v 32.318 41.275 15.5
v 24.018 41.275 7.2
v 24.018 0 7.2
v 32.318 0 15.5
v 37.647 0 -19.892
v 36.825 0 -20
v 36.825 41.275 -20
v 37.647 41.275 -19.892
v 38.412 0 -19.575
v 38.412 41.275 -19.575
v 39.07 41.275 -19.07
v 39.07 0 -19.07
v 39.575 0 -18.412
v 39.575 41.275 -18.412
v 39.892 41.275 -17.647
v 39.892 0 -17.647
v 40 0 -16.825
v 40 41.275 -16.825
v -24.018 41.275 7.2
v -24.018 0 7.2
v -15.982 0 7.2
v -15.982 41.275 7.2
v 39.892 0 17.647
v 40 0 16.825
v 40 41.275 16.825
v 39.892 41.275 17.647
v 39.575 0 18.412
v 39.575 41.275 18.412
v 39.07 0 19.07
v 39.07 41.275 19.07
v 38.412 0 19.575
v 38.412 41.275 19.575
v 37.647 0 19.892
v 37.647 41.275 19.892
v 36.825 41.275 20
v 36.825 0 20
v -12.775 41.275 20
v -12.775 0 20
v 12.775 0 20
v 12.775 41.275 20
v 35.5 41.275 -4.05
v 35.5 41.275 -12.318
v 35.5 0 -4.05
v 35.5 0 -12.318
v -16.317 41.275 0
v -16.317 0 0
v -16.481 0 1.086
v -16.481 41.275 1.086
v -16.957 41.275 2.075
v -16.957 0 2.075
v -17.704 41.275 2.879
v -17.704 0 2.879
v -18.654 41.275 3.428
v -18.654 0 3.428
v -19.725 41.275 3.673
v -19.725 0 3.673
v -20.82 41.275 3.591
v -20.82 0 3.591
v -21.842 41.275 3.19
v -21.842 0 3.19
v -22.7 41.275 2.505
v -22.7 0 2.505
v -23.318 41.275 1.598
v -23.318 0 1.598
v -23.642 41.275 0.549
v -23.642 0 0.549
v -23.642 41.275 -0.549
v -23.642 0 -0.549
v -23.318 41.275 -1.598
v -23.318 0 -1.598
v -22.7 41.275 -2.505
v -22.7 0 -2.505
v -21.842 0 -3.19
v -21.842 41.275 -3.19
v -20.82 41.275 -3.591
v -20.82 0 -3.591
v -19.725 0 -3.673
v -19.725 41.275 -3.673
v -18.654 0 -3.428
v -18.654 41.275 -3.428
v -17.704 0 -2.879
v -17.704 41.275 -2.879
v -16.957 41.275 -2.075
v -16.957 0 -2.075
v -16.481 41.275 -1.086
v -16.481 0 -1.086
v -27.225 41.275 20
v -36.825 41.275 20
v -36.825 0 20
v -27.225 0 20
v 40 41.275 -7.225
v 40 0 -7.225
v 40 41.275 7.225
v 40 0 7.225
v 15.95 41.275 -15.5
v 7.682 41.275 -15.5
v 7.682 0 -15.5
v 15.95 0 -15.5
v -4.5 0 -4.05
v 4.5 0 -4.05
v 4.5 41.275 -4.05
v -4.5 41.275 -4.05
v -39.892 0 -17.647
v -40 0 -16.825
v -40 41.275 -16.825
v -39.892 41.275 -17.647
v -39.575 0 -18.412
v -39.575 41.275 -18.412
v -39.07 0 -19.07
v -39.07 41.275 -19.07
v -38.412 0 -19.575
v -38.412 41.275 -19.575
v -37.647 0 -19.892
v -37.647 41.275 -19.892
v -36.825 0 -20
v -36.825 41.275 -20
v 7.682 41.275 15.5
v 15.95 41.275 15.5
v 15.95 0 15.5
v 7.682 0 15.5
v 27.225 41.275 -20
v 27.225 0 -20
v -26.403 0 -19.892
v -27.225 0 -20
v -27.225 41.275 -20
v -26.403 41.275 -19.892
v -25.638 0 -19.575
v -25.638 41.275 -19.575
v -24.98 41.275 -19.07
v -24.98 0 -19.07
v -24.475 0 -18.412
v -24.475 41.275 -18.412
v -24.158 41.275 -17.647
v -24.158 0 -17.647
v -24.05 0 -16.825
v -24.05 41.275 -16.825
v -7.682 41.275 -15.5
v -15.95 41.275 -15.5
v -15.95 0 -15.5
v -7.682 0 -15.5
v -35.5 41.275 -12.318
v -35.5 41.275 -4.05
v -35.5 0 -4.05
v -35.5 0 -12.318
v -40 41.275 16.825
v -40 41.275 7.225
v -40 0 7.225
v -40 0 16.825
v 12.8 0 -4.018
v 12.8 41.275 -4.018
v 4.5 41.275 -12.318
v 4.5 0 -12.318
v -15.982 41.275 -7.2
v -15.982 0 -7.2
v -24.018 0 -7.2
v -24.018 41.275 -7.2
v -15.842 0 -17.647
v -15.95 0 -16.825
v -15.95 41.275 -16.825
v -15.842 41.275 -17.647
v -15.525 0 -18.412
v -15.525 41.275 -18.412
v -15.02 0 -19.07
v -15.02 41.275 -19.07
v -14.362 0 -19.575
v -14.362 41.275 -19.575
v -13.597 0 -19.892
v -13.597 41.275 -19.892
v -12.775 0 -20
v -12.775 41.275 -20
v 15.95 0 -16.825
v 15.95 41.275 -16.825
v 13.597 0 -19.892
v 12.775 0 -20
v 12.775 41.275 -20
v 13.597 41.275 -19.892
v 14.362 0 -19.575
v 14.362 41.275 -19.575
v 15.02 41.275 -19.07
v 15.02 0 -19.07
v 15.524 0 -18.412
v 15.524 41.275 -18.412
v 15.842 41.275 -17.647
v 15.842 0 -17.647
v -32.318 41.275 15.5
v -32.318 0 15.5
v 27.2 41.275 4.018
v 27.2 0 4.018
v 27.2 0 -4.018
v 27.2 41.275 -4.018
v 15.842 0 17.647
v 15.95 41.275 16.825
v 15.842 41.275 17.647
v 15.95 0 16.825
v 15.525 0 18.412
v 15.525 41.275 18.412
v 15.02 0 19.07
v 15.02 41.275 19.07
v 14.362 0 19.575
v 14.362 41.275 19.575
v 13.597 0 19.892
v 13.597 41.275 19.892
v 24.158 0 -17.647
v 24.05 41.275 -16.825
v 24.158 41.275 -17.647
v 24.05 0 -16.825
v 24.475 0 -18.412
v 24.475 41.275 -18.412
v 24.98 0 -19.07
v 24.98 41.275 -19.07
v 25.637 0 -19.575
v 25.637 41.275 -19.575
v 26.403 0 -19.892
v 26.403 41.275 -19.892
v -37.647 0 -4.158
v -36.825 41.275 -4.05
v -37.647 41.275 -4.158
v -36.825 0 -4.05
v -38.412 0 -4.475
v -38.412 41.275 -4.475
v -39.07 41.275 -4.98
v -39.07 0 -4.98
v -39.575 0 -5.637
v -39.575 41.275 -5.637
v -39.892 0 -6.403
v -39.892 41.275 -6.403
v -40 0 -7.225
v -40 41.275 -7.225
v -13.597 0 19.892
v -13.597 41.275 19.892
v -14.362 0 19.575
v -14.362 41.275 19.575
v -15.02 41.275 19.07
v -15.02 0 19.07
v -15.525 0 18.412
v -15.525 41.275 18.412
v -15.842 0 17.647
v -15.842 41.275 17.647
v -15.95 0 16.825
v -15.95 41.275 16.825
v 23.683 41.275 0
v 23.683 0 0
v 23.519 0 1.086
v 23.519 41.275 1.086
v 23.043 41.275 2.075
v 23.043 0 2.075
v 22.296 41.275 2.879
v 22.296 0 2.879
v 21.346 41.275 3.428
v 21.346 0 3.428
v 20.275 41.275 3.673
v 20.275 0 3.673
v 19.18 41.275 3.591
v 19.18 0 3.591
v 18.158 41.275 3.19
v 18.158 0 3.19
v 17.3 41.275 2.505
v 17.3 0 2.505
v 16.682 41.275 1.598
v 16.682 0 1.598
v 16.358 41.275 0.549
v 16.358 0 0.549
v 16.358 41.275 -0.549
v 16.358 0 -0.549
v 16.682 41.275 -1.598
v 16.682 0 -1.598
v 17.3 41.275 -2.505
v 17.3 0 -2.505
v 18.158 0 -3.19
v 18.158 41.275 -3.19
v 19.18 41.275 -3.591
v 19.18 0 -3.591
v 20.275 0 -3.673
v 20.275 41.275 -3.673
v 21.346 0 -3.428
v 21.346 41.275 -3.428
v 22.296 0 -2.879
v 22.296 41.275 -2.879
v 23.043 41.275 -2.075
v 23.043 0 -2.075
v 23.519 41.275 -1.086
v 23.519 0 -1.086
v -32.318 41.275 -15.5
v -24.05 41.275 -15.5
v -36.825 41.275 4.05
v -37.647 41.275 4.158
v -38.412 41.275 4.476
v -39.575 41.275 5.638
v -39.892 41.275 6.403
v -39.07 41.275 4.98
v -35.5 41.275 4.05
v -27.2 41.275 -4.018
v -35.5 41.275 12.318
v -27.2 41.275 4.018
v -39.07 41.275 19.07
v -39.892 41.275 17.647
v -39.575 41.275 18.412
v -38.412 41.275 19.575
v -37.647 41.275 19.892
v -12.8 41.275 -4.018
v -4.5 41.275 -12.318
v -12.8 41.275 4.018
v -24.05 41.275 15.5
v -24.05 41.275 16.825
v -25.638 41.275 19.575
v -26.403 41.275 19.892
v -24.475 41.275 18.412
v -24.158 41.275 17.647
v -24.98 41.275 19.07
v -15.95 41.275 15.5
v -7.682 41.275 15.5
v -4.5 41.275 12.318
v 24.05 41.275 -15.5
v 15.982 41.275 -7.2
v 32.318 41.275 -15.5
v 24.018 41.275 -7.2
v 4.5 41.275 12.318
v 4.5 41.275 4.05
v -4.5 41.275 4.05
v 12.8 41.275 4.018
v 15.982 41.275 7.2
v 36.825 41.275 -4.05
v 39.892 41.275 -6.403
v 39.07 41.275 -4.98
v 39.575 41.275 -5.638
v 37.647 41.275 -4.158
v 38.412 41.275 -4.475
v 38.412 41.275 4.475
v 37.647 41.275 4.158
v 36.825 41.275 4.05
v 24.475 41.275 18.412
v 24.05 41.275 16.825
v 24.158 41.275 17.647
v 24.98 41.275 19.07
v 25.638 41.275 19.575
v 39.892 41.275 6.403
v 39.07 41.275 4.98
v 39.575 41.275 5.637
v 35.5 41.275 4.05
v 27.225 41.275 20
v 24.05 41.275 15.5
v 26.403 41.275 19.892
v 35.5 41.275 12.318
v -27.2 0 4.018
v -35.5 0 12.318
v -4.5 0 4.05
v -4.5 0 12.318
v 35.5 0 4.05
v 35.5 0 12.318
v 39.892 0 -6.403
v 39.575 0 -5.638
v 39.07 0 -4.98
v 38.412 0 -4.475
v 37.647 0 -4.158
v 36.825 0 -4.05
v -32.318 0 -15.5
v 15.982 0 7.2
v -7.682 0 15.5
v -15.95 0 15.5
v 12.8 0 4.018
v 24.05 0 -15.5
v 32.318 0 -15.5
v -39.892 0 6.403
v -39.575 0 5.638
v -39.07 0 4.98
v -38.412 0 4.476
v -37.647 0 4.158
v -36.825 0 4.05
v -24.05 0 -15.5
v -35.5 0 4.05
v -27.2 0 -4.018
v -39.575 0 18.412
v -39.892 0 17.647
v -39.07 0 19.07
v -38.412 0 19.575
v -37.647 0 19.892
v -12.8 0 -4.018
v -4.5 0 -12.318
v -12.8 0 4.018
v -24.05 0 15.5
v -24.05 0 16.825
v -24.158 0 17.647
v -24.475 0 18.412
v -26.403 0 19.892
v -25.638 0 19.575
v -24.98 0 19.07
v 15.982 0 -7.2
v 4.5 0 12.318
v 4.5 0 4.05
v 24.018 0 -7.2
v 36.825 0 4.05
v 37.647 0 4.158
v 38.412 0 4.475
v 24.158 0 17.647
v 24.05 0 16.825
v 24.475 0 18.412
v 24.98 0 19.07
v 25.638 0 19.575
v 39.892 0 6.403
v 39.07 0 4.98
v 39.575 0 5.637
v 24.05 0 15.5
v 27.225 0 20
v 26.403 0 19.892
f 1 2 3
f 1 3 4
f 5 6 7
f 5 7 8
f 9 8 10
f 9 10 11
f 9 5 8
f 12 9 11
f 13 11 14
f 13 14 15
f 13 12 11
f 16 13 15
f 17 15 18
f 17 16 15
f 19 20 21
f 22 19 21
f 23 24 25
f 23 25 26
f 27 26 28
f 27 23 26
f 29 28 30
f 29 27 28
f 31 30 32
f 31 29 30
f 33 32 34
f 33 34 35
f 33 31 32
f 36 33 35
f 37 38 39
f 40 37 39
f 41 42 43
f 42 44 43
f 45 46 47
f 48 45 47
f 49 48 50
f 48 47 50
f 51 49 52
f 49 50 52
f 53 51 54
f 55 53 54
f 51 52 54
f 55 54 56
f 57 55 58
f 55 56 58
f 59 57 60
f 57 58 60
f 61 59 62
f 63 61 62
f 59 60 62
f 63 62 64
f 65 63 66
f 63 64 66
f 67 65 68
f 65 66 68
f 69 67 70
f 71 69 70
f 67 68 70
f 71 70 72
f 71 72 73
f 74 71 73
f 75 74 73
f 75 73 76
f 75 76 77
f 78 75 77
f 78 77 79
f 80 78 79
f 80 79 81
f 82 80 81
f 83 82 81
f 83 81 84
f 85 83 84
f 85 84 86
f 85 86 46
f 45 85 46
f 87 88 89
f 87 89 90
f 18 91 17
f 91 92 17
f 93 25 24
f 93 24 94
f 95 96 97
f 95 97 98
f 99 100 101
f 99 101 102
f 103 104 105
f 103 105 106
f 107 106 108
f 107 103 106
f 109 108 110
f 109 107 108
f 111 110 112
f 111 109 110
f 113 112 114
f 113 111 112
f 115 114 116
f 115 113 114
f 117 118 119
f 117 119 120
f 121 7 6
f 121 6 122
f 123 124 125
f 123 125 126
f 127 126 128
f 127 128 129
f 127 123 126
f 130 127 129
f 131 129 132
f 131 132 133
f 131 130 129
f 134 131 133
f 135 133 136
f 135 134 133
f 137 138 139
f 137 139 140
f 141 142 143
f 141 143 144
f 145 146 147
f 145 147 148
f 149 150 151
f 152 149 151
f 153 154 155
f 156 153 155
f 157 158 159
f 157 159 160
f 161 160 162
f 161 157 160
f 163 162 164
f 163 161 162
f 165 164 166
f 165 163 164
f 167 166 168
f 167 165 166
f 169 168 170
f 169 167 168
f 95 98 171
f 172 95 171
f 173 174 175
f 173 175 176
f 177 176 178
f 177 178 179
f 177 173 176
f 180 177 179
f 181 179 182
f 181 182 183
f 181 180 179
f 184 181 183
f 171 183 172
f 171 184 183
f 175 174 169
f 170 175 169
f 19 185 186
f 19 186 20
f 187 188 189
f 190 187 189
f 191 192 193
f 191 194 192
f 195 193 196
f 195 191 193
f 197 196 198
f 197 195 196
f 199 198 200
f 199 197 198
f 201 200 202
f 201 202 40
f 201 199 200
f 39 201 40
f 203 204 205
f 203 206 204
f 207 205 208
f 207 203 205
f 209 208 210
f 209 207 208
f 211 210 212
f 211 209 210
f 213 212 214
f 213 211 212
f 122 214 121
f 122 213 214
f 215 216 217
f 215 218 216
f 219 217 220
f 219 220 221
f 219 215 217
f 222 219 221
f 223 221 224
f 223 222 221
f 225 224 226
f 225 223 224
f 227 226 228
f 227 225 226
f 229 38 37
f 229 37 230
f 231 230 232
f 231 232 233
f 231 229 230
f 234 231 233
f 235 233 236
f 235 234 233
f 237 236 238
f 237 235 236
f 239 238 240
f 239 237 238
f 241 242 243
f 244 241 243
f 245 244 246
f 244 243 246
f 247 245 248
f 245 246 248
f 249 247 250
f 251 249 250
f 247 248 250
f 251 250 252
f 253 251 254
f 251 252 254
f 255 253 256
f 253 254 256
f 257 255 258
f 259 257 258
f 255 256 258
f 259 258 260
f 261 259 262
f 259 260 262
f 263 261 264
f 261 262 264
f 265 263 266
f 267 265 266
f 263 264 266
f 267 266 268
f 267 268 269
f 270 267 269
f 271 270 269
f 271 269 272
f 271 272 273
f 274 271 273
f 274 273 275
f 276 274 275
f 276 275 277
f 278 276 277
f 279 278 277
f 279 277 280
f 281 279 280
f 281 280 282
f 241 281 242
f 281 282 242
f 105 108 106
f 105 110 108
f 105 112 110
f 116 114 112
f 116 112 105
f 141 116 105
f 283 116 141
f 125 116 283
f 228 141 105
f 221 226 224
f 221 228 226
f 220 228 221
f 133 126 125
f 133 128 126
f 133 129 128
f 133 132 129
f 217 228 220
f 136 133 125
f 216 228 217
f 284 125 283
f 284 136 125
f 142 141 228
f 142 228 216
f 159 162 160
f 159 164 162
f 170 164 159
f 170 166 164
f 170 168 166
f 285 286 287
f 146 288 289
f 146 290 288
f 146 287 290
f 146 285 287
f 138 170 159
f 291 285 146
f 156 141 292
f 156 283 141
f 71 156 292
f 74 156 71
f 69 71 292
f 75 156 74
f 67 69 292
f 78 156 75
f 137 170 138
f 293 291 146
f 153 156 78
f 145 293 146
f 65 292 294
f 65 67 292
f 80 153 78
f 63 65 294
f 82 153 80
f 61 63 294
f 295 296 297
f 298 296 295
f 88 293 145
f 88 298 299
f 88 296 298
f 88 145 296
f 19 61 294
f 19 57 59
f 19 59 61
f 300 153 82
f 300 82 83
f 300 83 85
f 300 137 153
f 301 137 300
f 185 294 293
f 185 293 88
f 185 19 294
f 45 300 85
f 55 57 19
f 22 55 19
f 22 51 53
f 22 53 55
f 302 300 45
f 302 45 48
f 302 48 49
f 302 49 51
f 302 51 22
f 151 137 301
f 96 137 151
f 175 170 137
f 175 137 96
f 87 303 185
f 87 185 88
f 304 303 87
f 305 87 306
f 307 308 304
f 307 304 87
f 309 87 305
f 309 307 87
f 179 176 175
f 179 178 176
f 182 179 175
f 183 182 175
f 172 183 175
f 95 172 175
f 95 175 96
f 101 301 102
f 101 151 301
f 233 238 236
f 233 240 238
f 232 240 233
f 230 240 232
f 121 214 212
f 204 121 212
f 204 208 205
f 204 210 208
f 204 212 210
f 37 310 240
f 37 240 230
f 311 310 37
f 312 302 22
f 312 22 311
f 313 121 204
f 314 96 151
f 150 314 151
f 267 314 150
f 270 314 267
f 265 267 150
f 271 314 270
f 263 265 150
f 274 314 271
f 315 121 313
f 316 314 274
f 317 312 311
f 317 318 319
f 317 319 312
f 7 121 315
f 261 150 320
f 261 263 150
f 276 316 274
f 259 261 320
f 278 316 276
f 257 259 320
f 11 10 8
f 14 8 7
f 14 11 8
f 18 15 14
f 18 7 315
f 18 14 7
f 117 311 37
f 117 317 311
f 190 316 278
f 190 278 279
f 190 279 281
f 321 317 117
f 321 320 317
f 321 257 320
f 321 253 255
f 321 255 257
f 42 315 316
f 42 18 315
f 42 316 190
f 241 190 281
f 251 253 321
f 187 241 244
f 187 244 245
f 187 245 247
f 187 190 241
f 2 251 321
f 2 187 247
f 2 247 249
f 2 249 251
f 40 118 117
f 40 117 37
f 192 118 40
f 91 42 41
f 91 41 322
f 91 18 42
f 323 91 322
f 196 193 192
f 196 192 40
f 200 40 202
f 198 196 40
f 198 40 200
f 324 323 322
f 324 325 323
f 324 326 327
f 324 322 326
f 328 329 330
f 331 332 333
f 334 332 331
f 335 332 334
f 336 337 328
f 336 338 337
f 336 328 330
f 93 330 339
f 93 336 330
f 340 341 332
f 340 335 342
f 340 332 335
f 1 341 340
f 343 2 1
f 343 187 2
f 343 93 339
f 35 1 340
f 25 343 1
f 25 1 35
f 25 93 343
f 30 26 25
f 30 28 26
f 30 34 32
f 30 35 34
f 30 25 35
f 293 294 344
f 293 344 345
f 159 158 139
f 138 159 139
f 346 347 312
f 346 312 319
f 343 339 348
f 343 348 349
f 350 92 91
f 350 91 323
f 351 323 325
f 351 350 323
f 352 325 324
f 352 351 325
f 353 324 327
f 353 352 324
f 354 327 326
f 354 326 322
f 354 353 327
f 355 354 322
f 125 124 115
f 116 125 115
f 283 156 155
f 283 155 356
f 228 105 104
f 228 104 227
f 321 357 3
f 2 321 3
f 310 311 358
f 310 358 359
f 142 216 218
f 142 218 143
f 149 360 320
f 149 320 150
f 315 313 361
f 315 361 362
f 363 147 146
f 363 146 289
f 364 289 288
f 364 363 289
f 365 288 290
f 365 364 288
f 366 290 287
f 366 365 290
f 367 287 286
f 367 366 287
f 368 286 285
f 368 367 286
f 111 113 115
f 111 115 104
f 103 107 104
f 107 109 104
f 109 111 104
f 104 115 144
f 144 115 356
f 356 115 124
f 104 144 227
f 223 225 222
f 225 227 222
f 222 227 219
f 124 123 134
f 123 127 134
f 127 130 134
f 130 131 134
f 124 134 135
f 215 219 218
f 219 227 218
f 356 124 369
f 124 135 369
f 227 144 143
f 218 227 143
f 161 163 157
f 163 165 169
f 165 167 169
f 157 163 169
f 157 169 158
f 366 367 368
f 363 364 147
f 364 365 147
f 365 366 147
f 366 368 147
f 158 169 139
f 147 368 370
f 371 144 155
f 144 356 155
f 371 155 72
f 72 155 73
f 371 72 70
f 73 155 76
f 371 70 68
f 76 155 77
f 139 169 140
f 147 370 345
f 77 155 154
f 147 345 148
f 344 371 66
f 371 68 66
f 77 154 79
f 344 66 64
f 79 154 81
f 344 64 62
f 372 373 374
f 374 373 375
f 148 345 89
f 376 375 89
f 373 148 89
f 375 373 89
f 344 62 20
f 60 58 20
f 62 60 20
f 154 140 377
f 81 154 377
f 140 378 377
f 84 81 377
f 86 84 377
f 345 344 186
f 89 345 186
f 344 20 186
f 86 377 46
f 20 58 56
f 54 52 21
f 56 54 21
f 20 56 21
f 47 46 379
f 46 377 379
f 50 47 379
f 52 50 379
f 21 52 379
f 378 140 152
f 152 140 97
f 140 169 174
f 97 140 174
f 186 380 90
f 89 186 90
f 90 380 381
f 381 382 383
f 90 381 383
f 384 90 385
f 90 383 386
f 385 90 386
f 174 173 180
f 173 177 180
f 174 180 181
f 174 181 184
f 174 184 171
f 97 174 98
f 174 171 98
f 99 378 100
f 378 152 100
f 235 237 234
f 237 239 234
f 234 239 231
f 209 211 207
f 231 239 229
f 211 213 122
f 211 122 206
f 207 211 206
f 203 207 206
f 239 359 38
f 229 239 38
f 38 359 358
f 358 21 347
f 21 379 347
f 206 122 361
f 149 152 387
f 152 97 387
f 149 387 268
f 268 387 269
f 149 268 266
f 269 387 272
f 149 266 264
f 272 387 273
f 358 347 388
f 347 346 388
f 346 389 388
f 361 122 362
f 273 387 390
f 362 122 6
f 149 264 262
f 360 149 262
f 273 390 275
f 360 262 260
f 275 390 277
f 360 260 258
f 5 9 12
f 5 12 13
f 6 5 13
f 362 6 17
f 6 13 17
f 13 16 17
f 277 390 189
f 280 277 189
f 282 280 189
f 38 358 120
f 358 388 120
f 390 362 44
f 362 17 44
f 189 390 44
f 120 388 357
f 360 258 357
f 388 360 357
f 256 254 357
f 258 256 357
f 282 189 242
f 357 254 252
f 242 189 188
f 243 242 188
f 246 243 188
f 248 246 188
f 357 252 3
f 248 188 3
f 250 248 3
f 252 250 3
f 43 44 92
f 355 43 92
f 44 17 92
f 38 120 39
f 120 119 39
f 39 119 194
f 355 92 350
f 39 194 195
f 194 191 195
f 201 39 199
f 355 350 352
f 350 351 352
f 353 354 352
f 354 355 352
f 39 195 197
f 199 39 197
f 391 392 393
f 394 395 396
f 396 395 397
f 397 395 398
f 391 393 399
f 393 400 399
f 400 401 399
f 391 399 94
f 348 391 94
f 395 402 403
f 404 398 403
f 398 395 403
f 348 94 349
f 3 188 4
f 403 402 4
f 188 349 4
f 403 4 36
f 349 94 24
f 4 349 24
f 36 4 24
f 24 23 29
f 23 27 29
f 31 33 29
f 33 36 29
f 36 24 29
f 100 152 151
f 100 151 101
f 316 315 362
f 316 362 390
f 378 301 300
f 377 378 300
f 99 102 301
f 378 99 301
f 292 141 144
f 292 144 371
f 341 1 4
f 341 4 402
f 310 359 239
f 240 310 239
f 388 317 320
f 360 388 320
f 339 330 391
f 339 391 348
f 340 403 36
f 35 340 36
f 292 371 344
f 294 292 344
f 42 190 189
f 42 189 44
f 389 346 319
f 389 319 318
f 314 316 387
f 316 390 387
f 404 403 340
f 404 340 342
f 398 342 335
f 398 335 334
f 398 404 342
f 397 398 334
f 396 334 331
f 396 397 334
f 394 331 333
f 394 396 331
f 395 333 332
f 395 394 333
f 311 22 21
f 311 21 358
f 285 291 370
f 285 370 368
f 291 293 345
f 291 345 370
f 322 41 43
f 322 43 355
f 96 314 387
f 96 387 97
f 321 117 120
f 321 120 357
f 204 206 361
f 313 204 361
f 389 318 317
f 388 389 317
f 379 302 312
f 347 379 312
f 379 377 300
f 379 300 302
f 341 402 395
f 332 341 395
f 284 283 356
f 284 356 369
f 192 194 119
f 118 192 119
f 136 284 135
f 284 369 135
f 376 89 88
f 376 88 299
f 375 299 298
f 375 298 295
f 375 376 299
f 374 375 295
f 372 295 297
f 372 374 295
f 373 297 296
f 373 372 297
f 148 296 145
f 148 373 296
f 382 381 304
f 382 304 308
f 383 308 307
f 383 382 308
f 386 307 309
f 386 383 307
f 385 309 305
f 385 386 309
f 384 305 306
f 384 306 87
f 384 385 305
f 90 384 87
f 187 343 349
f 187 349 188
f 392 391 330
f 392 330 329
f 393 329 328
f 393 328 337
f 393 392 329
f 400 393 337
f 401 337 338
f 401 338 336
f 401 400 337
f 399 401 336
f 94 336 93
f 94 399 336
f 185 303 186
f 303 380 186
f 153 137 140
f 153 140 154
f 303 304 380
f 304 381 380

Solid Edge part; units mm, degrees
sketch "Sketch1" plane through (0, 0, 0) normal (0, -1, 0) x (1, 0, 0)
  line L0 (-24.05, 16.825) -> (-24.05, 15.5)
  line L1 (-24.05, 15.5) -> (-32.318, 15.5)
  line L2 (-32.318, 15.5) -> (-24.018, 7.2)
  line L3 (-24.018, 7.2) -> (-15.982, 7.2)
  line L4 (-15.982, 7.2) -> (-7.682, 15.5)
  line L5 (-7.682, 15.5) -> (-15.95, 15.5)
  line L6 (-15.95, 15.5) -> (-15.95, 16.825)
  arc A0 (-12.775, 20) -> (-15.95, 16.825) centre (-12.775, 16.825) ccw
  line L7 (-12.775, 20) -> (12.775, 20)
  arc A1 (15.95, 16.825) -> (12.775, 20) centre (12.775, 16.825) ccw
  line L8 (15.95, 16.825) -> (15.95, 15.5)
  line L9 (15.95, 15.5) -> (7.682, 15.5)
  line L10 (7.682, 15.5) -> (15.982, 7.2)
  line L11 (15.982, 7.2) -> (24.018, 7.2)
  line L12 (24.018, 7.2) -> (32.318, 15.5)
  line L13 (32.318, 15.5) -> (24.05, 15.5)
  line L14 (24.05, 15.5) -> (24.05, 16.825)
  arc A2 (27.225, 20) -> (24.05, 16.825) centre (27.225, 16.825) ccw
  line L15 (27.225, 20) -> (36.825, 20)
  arc A3 (40, 16.825) -> (36.825, 20) centre (36.825, 16.825) ccw
  line L16 (40, 16.825) -> (40, 7.225)
  arc A4 (36.825, 4.05) -> (40, 7.225) centre (36.825, 7.225) ccw
  line L17 (36.825, 4.05) -> (35.5, 4.05)
  line L18 (35.5, 4.05) -> (35.5, 12.318)
  line L19 (35.5, 12.318) -> (27.2, 4.018)
  line L20 (27.2, 4.018) -> (27.2, -4.018)
  line L21 (27.2, -4.018) -> (35.5, -12.318)
  line L22 (35.5, -12.318) -> (35.5, -4.05)
  line L23 (35.5, -4.05) -> (36.825, -4.05)
  arc A5 (40, -7.225) -> (36.825, -4.05) centre (36.825, -7.225) ccw
  line L24 (40, -7.225) -> (40, -16.825)
  arc A6 (36.825, -20) -> (40, -16.825) centre (36.825, -16.825) ccw
  line L25 (36.825, -20) -> (27.2248, -20)
  arc A7 (24.0498, -16.825) -> (27.2248, -20) centre (27.2248, -16.825) ccw
  line L26 (24.0498, -16.825) -> (24.0498, -15.5)
  line L27 (24.0498, -15.5) -> (32.318, -15.5)
  line L28 (32.318, -15.5) -> (24.018, -7.2)
  line L29 (24.018, -7.2) -> (15.982, -7.2)
  line L30 (15.982, -7.2) -> (7.682, -15.5)
  line L31 (7.682, -15.5) -> (15.9498, -15.5)
  line L32 (15.9498, -15.5) -> (15.9498, -16.825)
  arc A8 (12.7748, -20) -> (15.9498, -16.825) centre (12.7748, -16.825) ccw
  line L33 (12.7748, -20) -> (-12.775, -20)
  arc A9 (-15.95, -16.825) -> (-12.775, -20) centre (-12.775, -16.825) ccw
  line L34 (-15.95, -16.825) -> (-15.95, -15.5)
  line L35 (-15.95, -15.5) -> (-7.682, -15.5)
  line L36 (-7.682, -15.5) -> (-15.982, -7.2)
  line L37 (-15.982, -7.2) -> (-24.018, -7.2)
  line L38 (-24.018, -7.2) -> (-32.318, -15.5)
  line L39 (-32.318, -15.5) -> (-24.05, -15.5)
  line L40 (-24.05, -15.5) -> (-24.05, -16.825)
  arc A10 (-27.225, -20) -> (-24.05, -16.825) centre (-27.225, -16.825) ccw
  line L41 (-27.225, -20) -> (-36.825, -20)
  arc A11 (-40, -16.825) -> (-36.825, -20) centre (-36.825, -16.825) ccw
  line L42 (-40, -16.825) -> (-40, -7.2248)
  arc A12 (-36.825, -4.0498) -> (-40, -7.2248) centre (-36.825, -7.2248) ccw
  line L43 (-36.825, -4.0498) -> (-35.5, -4.0498)
  line L44 (-35.5, -4.0498) -> (-35.5, -12.318)
  line L45 (-35.5, -12.318) -> (-27.2, -4.018)
  line L46 (-27.2, -4.018) -> (-27.2, 4.018)
  line L47 (-27.2, 4.018) -> (-35.5, 12.318)
  line L48 (-35.5, 12.318) -> (-35.5, 4.0502)
  line L49 (-35.5, 4.0502) -> (-36.825, 4.0502)
  arc A13 (-40, 7.2252) -> (-36.825, 4.0502) centre (-36.825, 7.2252) ccw
  line L50 (-40, 7.2252) -> (-40, 16.825)
  arc A14 (-36.825, 20) -> (-40, 16.825) centre (-36.825, 16.825) ccw
  line L51 (-36.825, 20) -> (-27.225, 20)
  arc A15 (-24.05, 16.825) -> (-27.225, 20) centre (-27.225, 16.825) ccw
  circle A16 centre (-20, 0) radius 3.683
  circle A17 centre (20, 0) radius 3.683
  line L52 (-4.5, 4.05) -> (4.5, 4.05)
  line L53 (4.5, 4.05) -> (4.5, 12.318)
  line L54 (4.5, 12.318) -> (12.8, 4.018)
  line L55 (12.8, 4.018) -> (12.8, -4.018)
  line L56 (12.8, -4.018) -> (4.5, -12.318)
  line L57 (4.5, -12.318) -> (4.5, -4.05)
  line L58 (4.5, -4.05) -> (-4.5, -4.05)
  line L59 (-4.5, -4.05) -> (-4.5, -12.318)
  line L60 (-4.5, -12.318) -> (-12.8, -4.018)
  line L61 (-12.8, -4.018) -> (-12.8, 4.018)
  line L62 (-12.8, 4.018) -> (-4.5, 12.318)
  line L63 (-4.5, 12.318) -> (-4.5, 4.05)
extrude "Protrusion1" add sketch "Sketch1" against normal blind 41.275
